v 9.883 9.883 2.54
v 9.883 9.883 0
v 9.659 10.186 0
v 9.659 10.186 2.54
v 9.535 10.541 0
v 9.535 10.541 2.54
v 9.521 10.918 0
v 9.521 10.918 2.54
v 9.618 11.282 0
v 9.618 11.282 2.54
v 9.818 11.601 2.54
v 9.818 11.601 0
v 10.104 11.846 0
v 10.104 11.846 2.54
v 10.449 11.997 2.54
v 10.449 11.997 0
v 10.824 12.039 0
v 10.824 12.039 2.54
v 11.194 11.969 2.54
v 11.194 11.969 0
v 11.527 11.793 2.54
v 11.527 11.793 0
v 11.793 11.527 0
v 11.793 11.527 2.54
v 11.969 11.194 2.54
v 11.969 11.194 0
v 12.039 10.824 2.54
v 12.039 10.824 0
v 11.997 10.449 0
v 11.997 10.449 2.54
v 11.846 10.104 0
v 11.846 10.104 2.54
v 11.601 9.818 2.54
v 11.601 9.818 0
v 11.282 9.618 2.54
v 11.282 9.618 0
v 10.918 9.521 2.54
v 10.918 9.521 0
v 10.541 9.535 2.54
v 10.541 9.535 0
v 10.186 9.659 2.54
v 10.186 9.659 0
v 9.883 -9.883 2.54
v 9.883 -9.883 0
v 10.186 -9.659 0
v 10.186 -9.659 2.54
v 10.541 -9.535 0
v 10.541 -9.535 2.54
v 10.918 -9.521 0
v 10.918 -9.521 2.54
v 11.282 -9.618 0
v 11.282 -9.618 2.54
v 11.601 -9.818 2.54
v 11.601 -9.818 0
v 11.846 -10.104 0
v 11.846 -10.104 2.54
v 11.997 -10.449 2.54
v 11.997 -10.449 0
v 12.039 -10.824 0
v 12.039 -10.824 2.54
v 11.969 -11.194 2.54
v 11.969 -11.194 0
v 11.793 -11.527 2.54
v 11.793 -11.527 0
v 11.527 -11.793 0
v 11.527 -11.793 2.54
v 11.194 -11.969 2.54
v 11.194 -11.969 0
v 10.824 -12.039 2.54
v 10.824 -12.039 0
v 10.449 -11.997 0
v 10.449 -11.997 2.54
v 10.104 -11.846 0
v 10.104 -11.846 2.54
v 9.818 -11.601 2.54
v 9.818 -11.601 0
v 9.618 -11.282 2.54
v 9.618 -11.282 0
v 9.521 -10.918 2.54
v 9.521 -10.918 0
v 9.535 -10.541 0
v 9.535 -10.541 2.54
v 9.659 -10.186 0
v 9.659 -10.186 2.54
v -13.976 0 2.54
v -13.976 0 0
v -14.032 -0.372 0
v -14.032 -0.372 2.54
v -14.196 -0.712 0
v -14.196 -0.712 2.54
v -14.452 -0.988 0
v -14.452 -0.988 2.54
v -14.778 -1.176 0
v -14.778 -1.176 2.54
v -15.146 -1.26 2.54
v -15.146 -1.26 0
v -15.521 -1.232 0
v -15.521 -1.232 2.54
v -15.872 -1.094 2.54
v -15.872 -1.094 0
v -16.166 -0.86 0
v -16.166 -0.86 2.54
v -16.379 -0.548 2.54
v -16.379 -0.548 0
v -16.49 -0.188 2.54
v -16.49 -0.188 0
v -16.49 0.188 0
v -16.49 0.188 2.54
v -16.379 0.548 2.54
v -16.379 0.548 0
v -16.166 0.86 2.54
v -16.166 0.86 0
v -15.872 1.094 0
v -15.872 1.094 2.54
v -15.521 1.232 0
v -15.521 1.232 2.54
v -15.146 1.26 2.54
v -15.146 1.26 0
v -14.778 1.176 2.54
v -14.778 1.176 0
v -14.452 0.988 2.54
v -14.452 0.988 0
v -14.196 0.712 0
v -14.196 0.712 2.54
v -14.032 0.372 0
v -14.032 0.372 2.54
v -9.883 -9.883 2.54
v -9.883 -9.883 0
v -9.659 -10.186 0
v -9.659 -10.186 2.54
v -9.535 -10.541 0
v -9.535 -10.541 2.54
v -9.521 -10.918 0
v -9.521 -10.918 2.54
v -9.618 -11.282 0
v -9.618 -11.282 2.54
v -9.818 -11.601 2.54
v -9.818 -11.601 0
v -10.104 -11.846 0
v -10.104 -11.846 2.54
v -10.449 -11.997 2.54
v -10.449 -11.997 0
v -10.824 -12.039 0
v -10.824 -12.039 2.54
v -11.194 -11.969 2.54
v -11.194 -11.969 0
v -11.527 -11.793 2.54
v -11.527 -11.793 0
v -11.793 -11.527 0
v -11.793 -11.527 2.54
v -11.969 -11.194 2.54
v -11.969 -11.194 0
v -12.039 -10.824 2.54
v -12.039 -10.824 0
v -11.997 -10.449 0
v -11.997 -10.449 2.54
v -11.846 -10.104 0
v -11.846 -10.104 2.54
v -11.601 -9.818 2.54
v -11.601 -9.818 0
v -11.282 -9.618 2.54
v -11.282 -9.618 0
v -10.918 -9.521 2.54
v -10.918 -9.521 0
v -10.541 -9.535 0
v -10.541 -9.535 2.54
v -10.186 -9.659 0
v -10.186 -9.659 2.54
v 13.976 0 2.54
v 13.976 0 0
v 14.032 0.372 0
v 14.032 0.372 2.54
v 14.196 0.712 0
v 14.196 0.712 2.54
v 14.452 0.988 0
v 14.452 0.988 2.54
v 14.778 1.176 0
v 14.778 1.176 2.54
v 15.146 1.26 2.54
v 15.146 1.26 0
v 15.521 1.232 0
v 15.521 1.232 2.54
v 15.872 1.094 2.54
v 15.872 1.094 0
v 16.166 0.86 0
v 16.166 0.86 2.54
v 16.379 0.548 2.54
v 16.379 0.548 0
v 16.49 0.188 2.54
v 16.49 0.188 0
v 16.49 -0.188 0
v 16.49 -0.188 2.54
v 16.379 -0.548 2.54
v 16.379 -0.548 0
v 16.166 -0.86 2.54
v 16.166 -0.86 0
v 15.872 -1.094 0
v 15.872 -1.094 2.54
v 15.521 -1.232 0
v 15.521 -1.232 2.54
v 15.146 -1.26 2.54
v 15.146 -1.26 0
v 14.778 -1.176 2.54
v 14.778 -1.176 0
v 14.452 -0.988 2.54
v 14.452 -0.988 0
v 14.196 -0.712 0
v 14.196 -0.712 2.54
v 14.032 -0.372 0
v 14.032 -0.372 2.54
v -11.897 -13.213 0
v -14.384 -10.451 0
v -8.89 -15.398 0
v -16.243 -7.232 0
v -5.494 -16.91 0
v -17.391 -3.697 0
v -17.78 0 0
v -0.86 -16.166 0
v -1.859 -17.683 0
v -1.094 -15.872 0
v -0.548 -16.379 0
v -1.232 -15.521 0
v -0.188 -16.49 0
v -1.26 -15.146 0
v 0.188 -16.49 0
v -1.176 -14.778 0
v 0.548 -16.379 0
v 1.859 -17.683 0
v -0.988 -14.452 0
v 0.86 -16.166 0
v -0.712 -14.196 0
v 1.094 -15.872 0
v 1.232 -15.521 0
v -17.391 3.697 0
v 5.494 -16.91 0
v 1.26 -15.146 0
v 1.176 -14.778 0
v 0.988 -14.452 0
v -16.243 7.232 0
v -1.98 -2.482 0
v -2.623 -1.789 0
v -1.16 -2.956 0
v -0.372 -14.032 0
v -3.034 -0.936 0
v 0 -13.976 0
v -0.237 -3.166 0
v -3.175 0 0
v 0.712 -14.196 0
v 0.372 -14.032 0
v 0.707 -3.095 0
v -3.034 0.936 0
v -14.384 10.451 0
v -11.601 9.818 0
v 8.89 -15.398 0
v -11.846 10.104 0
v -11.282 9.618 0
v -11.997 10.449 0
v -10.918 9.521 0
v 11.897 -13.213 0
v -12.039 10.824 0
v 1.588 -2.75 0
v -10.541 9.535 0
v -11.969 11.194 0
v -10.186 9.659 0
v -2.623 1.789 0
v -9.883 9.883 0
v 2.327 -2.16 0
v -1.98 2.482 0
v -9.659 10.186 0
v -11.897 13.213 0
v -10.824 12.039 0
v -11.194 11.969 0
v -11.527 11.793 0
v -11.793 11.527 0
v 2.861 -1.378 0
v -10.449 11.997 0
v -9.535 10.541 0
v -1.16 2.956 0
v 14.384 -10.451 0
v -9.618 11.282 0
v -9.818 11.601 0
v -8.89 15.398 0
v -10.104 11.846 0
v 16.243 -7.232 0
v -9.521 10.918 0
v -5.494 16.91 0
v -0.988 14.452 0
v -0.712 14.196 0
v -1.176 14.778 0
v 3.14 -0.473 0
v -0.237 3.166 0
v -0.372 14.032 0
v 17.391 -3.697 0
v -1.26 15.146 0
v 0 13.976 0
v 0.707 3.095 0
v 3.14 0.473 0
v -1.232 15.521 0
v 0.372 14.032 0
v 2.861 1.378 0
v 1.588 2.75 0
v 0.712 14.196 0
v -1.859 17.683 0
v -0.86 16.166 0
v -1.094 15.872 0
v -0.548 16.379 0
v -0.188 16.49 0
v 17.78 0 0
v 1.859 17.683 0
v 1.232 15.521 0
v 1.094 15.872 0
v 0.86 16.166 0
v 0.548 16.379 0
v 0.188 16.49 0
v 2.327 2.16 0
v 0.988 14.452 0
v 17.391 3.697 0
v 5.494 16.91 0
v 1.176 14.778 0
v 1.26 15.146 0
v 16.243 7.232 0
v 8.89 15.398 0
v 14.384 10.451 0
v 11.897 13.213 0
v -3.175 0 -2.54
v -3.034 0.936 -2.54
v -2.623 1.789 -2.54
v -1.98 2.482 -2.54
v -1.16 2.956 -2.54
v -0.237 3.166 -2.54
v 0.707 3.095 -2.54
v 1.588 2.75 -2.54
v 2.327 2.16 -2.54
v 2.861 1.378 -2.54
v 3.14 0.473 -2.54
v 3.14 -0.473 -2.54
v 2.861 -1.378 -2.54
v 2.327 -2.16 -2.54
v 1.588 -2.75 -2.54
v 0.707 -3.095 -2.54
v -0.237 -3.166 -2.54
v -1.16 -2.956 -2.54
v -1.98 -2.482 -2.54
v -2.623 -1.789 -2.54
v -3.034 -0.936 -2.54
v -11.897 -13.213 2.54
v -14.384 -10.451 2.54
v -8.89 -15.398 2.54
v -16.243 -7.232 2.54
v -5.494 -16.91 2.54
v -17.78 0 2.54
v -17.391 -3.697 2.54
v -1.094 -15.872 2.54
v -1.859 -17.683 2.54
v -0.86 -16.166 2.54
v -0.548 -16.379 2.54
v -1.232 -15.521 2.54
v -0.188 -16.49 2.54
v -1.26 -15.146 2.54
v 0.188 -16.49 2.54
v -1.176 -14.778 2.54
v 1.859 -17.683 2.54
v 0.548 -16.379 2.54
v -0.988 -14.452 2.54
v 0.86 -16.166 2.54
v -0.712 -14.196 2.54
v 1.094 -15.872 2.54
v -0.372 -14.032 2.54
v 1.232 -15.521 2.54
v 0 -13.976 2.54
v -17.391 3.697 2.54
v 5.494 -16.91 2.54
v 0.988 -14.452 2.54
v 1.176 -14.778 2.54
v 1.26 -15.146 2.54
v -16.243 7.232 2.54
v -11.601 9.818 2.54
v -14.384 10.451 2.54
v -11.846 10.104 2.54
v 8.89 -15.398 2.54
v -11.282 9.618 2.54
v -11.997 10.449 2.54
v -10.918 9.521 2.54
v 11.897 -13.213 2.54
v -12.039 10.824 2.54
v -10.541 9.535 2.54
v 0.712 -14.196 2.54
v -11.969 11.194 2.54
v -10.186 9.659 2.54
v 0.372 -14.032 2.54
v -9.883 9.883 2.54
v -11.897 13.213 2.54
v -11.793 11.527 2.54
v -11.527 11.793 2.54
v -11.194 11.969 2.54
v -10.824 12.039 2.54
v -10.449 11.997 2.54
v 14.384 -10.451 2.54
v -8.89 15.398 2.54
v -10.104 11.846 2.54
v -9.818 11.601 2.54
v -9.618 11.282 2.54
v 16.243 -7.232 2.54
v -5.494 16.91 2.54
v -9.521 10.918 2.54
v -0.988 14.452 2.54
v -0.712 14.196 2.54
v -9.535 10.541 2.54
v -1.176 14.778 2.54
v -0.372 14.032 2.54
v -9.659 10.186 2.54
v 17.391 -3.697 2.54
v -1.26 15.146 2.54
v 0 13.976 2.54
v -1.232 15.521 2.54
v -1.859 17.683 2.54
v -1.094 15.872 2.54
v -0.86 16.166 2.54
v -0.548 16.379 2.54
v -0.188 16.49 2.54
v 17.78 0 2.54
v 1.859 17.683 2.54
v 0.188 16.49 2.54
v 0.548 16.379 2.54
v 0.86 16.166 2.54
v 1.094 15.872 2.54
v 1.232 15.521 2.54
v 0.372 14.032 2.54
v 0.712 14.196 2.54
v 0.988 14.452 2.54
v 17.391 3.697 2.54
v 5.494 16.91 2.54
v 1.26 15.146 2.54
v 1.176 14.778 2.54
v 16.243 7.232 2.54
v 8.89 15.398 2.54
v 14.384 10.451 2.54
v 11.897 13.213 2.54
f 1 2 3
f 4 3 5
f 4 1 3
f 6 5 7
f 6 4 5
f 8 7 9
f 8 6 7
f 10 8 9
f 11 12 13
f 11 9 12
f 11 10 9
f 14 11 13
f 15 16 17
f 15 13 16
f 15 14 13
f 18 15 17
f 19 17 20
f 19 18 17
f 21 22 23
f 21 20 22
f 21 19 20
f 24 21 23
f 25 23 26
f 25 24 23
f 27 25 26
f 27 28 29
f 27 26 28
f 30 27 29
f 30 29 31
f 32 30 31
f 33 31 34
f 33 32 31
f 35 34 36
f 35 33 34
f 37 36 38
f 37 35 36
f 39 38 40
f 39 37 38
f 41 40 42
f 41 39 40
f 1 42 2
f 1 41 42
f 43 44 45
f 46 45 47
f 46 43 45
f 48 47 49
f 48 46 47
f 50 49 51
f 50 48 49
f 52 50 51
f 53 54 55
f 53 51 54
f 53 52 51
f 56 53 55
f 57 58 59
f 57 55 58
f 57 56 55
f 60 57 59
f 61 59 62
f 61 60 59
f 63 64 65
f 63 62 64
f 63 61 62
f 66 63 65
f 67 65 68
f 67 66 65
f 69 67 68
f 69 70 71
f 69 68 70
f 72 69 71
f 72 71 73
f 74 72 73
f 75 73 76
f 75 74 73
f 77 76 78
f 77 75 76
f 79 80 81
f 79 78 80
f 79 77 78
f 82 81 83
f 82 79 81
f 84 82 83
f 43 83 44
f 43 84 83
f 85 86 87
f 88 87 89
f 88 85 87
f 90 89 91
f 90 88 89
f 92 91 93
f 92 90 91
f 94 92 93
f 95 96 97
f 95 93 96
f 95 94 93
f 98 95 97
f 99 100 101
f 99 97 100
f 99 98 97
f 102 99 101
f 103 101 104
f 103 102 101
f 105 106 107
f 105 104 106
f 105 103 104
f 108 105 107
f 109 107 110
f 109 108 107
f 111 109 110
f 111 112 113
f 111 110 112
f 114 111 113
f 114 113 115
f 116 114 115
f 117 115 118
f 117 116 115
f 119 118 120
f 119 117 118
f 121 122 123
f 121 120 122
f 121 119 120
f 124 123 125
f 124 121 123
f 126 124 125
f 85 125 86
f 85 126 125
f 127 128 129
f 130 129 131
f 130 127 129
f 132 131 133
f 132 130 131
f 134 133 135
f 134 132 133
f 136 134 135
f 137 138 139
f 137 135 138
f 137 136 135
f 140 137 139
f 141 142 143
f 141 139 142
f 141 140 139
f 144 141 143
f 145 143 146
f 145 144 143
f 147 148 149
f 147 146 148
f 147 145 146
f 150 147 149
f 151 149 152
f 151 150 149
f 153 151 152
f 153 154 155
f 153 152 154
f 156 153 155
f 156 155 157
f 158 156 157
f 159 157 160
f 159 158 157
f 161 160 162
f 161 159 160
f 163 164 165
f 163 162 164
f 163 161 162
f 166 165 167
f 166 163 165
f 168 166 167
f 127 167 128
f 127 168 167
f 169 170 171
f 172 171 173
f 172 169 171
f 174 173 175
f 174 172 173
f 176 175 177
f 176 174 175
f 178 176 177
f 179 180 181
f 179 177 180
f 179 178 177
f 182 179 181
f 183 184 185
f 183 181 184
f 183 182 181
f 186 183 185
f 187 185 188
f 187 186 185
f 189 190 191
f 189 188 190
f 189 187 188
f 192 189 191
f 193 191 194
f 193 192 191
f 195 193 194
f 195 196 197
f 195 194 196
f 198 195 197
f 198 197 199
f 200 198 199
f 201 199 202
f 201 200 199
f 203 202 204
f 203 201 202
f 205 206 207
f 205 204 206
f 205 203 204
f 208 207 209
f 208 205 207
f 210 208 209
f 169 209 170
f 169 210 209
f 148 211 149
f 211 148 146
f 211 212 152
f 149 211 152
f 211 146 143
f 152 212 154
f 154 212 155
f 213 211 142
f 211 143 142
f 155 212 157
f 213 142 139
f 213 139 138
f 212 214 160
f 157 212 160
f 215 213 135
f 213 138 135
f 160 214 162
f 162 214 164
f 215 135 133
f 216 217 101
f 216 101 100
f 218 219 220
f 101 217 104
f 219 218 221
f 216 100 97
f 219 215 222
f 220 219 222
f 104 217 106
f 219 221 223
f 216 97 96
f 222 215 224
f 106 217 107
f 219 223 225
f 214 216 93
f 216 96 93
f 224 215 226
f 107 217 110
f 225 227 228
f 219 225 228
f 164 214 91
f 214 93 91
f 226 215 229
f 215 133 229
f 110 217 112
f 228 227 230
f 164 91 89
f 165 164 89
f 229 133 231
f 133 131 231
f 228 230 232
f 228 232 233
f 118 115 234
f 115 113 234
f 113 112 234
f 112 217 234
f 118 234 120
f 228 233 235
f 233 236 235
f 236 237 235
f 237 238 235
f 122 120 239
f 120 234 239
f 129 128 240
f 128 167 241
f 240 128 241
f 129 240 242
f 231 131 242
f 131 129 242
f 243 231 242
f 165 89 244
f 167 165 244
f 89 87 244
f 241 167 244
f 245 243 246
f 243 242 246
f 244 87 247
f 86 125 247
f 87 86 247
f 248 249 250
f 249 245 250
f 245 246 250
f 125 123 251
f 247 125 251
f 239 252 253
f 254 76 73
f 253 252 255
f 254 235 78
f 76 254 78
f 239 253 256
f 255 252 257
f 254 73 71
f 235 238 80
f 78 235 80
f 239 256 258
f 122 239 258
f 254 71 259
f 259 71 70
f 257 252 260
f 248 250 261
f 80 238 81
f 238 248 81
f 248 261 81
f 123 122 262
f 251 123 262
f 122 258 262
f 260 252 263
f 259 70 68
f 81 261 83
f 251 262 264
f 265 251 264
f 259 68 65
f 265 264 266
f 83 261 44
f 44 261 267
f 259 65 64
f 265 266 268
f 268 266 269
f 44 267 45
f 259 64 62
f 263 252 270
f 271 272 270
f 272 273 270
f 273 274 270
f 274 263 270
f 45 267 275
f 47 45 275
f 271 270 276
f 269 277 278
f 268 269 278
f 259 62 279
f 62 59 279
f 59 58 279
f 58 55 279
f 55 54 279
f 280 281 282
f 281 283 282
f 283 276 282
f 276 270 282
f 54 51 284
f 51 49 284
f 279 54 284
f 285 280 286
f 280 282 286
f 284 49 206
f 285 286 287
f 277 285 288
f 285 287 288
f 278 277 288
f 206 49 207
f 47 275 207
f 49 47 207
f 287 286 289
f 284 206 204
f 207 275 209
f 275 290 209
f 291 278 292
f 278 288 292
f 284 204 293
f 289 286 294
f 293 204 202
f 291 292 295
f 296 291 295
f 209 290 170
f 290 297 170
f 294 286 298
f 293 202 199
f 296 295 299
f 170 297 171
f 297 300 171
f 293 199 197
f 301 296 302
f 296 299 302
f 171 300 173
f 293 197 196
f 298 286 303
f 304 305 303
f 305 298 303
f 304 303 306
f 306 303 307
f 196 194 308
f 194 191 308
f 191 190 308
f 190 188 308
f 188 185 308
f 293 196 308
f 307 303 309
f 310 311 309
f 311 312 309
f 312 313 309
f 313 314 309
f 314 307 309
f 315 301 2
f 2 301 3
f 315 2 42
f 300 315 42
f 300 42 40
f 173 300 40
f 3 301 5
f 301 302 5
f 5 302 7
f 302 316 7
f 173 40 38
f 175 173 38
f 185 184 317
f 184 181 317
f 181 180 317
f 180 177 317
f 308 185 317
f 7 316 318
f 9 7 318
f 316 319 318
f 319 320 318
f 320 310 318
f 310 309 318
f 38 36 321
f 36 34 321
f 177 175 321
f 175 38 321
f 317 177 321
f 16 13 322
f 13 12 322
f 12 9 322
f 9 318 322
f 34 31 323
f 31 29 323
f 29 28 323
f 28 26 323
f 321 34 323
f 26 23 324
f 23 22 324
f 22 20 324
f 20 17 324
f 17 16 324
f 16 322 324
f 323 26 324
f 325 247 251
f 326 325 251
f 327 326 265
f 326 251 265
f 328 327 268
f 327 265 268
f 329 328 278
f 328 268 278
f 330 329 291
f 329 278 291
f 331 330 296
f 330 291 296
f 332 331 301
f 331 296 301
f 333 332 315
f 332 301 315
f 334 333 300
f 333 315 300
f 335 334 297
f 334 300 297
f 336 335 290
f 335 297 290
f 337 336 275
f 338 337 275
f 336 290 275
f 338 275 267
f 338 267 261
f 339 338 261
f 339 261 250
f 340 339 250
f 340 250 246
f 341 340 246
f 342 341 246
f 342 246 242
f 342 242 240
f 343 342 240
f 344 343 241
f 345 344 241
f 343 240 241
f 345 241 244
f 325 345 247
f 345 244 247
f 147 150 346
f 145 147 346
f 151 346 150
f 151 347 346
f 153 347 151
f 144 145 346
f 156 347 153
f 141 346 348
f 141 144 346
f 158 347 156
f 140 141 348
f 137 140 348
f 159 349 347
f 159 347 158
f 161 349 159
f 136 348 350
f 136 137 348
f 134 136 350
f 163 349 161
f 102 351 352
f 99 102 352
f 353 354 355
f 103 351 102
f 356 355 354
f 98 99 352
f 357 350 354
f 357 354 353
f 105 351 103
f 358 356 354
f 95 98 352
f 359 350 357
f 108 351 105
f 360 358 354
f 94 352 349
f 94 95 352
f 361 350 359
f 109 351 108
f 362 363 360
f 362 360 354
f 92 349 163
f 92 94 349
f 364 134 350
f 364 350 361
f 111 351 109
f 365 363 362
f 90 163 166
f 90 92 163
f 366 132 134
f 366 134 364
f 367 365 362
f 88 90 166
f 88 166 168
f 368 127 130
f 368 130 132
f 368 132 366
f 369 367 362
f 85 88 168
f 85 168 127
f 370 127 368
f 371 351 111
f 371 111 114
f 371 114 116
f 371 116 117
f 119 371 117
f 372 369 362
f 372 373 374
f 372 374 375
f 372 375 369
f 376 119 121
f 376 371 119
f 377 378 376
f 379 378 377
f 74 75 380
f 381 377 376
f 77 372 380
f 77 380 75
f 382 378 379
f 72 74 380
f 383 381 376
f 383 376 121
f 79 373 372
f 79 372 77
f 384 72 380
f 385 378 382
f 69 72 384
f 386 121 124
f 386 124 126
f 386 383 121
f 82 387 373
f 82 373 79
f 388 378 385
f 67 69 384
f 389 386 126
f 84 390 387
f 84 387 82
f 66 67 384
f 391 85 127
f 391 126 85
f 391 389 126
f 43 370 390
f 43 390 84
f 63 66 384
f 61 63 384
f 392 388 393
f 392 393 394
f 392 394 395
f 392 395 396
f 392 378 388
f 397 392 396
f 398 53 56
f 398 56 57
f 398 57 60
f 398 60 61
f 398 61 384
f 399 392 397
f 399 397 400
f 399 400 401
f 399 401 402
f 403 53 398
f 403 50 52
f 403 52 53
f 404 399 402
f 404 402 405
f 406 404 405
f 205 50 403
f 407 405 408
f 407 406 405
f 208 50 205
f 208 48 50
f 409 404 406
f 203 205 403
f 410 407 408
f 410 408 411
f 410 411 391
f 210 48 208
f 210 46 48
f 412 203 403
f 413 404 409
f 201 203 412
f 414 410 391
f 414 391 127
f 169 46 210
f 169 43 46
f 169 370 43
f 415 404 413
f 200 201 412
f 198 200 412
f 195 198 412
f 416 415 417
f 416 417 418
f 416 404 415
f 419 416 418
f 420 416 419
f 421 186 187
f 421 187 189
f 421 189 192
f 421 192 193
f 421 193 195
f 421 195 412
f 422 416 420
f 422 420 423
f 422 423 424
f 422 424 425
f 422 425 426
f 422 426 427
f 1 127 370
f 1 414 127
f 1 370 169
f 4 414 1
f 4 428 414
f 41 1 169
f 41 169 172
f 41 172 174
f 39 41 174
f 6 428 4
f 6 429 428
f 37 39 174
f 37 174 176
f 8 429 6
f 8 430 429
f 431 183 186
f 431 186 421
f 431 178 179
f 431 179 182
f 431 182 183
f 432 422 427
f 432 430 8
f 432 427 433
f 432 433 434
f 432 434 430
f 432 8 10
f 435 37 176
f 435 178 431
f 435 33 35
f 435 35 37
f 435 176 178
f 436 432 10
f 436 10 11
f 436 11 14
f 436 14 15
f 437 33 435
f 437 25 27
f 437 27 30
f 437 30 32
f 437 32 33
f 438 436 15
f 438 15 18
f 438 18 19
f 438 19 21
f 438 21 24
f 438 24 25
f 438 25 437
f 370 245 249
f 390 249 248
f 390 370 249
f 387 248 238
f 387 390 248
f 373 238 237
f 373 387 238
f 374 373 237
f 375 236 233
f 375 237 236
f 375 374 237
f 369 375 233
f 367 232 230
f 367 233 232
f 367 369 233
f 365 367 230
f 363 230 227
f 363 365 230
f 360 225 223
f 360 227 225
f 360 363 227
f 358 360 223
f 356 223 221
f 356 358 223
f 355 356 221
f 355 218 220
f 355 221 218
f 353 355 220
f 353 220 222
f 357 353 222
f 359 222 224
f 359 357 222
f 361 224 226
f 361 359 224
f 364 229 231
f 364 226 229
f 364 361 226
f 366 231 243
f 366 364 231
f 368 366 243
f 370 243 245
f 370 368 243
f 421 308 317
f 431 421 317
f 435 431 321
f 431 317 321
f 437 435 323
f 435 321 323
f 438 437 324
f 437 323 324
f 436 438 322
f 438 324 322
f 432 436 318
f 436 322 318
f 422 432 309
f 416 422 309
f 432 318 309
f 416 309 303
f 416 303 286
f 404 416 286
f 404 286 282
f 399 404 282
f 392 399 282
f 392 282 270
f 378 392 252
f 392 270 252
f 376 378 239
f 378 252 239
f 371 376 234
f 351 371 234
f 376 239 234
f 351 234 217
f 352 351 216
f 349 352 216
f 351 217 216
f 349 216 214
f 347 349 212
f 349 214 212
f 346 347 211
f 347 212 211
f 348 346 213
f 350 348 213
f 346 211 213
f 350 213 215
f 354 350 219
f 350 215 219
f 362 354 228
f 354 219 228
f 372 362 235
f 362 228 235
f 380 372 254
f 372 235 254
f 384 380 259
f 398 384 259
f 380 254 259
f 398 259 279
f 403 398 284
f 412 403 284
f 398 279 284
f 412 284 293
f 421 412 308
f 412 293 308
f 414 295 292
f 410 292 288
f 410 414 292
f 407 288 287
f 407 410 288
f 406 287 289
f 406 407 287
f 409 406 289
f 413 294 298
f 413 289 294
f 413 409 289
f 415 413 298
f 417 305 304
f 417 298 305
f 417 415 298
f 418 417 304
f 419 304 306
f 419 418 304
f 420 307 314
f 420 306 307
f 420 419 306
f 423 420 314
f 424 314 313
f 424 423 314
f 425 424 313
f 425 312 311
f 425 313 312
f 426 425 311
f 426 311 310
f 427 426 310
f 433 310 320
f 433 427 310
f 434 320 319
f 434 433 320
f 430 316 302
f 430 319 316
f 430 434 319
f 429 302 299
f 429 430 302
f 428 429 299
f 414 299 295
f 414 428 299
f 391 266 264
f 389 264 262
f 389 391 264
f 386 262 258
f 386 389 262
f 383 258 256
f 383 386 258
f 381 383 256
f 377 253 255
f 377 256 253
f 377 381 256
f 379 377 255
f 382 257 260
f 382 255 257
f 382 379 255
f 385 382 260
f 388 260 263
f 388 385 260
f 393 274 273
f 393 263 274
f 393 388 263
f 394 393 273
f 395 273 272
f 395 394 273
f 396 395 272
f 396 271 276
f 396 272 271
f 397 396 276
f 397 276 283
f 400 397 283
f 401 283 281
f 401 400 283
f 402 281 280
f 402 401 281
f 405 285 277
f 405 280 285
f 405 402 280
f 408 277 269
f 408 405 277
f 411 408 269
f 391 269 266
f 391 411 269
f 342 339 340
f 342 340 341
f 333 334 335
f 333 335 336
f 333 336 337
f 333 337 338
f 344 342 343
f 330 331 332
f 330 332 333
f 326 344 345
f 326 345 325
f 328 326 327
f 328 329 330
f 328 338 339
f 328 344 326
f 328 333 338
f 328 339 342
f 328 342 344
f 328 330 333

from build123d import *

# Parameters (mm, degrees)
SKETCH1_R         = 17.78
EXTRUDE1_DEPTH    = 2.54
CIRPATTERN2_COUNT = 8
SKETCH7_R         = 3.175
EXTRUDE2_DEPTH    = 2.54


with BuildPart() as part:
    # Sketch1 → Extrude1 (new body)
    with BuildSketch(Plane.XY):
        Circle(SKETCH1_R)
    extrude(amount=EXTRUDE1_DEPTH)

    # Sketch6 → #39 (0.0995) Diameter Hole2 (revolve, cut)
    with BuildSketch(Plane(origin=(0, 15.24, 2.54), x_dir=(0, -1, 0), z_dir=(1, 0, 0))):
        Polygon((0, 0), (0, 10.919277521), (1.26365, 10.16), (1.26365, 0), align=None)
    f_39_0_0995_diameter_hole2 = revolve(axis=Axis((0, 15.24, 8.89), (0, 0, -1)), mode=Mode.SUBTRACT)

    # CirPattern2: #39 (0.0995) Diameter Hole2 ×8 about axis
    cirpattern2_axis = Axis((0, 0, 0), (0, 0, 1))
    for i in range(1, CIRPATTERN2_COUNT):
        add(f_39_0_0995_diameter_hole2.rotate(cirpattern2_axis, i * 360 / CIRPATTERN2_COUNT), mode=Mode.SUBTRACT)

    # Sketch7 → Extrude2 (add)
    with BuildSketch(Plane(origin=(0, 0, 0), x_dir=(-1, 0, 0), z_dir=(0, 0, -1))):
        Circle(SKETCH7_R)
    extrude(amount=EXTRUDE2_DEPTH)


solid = part.part
